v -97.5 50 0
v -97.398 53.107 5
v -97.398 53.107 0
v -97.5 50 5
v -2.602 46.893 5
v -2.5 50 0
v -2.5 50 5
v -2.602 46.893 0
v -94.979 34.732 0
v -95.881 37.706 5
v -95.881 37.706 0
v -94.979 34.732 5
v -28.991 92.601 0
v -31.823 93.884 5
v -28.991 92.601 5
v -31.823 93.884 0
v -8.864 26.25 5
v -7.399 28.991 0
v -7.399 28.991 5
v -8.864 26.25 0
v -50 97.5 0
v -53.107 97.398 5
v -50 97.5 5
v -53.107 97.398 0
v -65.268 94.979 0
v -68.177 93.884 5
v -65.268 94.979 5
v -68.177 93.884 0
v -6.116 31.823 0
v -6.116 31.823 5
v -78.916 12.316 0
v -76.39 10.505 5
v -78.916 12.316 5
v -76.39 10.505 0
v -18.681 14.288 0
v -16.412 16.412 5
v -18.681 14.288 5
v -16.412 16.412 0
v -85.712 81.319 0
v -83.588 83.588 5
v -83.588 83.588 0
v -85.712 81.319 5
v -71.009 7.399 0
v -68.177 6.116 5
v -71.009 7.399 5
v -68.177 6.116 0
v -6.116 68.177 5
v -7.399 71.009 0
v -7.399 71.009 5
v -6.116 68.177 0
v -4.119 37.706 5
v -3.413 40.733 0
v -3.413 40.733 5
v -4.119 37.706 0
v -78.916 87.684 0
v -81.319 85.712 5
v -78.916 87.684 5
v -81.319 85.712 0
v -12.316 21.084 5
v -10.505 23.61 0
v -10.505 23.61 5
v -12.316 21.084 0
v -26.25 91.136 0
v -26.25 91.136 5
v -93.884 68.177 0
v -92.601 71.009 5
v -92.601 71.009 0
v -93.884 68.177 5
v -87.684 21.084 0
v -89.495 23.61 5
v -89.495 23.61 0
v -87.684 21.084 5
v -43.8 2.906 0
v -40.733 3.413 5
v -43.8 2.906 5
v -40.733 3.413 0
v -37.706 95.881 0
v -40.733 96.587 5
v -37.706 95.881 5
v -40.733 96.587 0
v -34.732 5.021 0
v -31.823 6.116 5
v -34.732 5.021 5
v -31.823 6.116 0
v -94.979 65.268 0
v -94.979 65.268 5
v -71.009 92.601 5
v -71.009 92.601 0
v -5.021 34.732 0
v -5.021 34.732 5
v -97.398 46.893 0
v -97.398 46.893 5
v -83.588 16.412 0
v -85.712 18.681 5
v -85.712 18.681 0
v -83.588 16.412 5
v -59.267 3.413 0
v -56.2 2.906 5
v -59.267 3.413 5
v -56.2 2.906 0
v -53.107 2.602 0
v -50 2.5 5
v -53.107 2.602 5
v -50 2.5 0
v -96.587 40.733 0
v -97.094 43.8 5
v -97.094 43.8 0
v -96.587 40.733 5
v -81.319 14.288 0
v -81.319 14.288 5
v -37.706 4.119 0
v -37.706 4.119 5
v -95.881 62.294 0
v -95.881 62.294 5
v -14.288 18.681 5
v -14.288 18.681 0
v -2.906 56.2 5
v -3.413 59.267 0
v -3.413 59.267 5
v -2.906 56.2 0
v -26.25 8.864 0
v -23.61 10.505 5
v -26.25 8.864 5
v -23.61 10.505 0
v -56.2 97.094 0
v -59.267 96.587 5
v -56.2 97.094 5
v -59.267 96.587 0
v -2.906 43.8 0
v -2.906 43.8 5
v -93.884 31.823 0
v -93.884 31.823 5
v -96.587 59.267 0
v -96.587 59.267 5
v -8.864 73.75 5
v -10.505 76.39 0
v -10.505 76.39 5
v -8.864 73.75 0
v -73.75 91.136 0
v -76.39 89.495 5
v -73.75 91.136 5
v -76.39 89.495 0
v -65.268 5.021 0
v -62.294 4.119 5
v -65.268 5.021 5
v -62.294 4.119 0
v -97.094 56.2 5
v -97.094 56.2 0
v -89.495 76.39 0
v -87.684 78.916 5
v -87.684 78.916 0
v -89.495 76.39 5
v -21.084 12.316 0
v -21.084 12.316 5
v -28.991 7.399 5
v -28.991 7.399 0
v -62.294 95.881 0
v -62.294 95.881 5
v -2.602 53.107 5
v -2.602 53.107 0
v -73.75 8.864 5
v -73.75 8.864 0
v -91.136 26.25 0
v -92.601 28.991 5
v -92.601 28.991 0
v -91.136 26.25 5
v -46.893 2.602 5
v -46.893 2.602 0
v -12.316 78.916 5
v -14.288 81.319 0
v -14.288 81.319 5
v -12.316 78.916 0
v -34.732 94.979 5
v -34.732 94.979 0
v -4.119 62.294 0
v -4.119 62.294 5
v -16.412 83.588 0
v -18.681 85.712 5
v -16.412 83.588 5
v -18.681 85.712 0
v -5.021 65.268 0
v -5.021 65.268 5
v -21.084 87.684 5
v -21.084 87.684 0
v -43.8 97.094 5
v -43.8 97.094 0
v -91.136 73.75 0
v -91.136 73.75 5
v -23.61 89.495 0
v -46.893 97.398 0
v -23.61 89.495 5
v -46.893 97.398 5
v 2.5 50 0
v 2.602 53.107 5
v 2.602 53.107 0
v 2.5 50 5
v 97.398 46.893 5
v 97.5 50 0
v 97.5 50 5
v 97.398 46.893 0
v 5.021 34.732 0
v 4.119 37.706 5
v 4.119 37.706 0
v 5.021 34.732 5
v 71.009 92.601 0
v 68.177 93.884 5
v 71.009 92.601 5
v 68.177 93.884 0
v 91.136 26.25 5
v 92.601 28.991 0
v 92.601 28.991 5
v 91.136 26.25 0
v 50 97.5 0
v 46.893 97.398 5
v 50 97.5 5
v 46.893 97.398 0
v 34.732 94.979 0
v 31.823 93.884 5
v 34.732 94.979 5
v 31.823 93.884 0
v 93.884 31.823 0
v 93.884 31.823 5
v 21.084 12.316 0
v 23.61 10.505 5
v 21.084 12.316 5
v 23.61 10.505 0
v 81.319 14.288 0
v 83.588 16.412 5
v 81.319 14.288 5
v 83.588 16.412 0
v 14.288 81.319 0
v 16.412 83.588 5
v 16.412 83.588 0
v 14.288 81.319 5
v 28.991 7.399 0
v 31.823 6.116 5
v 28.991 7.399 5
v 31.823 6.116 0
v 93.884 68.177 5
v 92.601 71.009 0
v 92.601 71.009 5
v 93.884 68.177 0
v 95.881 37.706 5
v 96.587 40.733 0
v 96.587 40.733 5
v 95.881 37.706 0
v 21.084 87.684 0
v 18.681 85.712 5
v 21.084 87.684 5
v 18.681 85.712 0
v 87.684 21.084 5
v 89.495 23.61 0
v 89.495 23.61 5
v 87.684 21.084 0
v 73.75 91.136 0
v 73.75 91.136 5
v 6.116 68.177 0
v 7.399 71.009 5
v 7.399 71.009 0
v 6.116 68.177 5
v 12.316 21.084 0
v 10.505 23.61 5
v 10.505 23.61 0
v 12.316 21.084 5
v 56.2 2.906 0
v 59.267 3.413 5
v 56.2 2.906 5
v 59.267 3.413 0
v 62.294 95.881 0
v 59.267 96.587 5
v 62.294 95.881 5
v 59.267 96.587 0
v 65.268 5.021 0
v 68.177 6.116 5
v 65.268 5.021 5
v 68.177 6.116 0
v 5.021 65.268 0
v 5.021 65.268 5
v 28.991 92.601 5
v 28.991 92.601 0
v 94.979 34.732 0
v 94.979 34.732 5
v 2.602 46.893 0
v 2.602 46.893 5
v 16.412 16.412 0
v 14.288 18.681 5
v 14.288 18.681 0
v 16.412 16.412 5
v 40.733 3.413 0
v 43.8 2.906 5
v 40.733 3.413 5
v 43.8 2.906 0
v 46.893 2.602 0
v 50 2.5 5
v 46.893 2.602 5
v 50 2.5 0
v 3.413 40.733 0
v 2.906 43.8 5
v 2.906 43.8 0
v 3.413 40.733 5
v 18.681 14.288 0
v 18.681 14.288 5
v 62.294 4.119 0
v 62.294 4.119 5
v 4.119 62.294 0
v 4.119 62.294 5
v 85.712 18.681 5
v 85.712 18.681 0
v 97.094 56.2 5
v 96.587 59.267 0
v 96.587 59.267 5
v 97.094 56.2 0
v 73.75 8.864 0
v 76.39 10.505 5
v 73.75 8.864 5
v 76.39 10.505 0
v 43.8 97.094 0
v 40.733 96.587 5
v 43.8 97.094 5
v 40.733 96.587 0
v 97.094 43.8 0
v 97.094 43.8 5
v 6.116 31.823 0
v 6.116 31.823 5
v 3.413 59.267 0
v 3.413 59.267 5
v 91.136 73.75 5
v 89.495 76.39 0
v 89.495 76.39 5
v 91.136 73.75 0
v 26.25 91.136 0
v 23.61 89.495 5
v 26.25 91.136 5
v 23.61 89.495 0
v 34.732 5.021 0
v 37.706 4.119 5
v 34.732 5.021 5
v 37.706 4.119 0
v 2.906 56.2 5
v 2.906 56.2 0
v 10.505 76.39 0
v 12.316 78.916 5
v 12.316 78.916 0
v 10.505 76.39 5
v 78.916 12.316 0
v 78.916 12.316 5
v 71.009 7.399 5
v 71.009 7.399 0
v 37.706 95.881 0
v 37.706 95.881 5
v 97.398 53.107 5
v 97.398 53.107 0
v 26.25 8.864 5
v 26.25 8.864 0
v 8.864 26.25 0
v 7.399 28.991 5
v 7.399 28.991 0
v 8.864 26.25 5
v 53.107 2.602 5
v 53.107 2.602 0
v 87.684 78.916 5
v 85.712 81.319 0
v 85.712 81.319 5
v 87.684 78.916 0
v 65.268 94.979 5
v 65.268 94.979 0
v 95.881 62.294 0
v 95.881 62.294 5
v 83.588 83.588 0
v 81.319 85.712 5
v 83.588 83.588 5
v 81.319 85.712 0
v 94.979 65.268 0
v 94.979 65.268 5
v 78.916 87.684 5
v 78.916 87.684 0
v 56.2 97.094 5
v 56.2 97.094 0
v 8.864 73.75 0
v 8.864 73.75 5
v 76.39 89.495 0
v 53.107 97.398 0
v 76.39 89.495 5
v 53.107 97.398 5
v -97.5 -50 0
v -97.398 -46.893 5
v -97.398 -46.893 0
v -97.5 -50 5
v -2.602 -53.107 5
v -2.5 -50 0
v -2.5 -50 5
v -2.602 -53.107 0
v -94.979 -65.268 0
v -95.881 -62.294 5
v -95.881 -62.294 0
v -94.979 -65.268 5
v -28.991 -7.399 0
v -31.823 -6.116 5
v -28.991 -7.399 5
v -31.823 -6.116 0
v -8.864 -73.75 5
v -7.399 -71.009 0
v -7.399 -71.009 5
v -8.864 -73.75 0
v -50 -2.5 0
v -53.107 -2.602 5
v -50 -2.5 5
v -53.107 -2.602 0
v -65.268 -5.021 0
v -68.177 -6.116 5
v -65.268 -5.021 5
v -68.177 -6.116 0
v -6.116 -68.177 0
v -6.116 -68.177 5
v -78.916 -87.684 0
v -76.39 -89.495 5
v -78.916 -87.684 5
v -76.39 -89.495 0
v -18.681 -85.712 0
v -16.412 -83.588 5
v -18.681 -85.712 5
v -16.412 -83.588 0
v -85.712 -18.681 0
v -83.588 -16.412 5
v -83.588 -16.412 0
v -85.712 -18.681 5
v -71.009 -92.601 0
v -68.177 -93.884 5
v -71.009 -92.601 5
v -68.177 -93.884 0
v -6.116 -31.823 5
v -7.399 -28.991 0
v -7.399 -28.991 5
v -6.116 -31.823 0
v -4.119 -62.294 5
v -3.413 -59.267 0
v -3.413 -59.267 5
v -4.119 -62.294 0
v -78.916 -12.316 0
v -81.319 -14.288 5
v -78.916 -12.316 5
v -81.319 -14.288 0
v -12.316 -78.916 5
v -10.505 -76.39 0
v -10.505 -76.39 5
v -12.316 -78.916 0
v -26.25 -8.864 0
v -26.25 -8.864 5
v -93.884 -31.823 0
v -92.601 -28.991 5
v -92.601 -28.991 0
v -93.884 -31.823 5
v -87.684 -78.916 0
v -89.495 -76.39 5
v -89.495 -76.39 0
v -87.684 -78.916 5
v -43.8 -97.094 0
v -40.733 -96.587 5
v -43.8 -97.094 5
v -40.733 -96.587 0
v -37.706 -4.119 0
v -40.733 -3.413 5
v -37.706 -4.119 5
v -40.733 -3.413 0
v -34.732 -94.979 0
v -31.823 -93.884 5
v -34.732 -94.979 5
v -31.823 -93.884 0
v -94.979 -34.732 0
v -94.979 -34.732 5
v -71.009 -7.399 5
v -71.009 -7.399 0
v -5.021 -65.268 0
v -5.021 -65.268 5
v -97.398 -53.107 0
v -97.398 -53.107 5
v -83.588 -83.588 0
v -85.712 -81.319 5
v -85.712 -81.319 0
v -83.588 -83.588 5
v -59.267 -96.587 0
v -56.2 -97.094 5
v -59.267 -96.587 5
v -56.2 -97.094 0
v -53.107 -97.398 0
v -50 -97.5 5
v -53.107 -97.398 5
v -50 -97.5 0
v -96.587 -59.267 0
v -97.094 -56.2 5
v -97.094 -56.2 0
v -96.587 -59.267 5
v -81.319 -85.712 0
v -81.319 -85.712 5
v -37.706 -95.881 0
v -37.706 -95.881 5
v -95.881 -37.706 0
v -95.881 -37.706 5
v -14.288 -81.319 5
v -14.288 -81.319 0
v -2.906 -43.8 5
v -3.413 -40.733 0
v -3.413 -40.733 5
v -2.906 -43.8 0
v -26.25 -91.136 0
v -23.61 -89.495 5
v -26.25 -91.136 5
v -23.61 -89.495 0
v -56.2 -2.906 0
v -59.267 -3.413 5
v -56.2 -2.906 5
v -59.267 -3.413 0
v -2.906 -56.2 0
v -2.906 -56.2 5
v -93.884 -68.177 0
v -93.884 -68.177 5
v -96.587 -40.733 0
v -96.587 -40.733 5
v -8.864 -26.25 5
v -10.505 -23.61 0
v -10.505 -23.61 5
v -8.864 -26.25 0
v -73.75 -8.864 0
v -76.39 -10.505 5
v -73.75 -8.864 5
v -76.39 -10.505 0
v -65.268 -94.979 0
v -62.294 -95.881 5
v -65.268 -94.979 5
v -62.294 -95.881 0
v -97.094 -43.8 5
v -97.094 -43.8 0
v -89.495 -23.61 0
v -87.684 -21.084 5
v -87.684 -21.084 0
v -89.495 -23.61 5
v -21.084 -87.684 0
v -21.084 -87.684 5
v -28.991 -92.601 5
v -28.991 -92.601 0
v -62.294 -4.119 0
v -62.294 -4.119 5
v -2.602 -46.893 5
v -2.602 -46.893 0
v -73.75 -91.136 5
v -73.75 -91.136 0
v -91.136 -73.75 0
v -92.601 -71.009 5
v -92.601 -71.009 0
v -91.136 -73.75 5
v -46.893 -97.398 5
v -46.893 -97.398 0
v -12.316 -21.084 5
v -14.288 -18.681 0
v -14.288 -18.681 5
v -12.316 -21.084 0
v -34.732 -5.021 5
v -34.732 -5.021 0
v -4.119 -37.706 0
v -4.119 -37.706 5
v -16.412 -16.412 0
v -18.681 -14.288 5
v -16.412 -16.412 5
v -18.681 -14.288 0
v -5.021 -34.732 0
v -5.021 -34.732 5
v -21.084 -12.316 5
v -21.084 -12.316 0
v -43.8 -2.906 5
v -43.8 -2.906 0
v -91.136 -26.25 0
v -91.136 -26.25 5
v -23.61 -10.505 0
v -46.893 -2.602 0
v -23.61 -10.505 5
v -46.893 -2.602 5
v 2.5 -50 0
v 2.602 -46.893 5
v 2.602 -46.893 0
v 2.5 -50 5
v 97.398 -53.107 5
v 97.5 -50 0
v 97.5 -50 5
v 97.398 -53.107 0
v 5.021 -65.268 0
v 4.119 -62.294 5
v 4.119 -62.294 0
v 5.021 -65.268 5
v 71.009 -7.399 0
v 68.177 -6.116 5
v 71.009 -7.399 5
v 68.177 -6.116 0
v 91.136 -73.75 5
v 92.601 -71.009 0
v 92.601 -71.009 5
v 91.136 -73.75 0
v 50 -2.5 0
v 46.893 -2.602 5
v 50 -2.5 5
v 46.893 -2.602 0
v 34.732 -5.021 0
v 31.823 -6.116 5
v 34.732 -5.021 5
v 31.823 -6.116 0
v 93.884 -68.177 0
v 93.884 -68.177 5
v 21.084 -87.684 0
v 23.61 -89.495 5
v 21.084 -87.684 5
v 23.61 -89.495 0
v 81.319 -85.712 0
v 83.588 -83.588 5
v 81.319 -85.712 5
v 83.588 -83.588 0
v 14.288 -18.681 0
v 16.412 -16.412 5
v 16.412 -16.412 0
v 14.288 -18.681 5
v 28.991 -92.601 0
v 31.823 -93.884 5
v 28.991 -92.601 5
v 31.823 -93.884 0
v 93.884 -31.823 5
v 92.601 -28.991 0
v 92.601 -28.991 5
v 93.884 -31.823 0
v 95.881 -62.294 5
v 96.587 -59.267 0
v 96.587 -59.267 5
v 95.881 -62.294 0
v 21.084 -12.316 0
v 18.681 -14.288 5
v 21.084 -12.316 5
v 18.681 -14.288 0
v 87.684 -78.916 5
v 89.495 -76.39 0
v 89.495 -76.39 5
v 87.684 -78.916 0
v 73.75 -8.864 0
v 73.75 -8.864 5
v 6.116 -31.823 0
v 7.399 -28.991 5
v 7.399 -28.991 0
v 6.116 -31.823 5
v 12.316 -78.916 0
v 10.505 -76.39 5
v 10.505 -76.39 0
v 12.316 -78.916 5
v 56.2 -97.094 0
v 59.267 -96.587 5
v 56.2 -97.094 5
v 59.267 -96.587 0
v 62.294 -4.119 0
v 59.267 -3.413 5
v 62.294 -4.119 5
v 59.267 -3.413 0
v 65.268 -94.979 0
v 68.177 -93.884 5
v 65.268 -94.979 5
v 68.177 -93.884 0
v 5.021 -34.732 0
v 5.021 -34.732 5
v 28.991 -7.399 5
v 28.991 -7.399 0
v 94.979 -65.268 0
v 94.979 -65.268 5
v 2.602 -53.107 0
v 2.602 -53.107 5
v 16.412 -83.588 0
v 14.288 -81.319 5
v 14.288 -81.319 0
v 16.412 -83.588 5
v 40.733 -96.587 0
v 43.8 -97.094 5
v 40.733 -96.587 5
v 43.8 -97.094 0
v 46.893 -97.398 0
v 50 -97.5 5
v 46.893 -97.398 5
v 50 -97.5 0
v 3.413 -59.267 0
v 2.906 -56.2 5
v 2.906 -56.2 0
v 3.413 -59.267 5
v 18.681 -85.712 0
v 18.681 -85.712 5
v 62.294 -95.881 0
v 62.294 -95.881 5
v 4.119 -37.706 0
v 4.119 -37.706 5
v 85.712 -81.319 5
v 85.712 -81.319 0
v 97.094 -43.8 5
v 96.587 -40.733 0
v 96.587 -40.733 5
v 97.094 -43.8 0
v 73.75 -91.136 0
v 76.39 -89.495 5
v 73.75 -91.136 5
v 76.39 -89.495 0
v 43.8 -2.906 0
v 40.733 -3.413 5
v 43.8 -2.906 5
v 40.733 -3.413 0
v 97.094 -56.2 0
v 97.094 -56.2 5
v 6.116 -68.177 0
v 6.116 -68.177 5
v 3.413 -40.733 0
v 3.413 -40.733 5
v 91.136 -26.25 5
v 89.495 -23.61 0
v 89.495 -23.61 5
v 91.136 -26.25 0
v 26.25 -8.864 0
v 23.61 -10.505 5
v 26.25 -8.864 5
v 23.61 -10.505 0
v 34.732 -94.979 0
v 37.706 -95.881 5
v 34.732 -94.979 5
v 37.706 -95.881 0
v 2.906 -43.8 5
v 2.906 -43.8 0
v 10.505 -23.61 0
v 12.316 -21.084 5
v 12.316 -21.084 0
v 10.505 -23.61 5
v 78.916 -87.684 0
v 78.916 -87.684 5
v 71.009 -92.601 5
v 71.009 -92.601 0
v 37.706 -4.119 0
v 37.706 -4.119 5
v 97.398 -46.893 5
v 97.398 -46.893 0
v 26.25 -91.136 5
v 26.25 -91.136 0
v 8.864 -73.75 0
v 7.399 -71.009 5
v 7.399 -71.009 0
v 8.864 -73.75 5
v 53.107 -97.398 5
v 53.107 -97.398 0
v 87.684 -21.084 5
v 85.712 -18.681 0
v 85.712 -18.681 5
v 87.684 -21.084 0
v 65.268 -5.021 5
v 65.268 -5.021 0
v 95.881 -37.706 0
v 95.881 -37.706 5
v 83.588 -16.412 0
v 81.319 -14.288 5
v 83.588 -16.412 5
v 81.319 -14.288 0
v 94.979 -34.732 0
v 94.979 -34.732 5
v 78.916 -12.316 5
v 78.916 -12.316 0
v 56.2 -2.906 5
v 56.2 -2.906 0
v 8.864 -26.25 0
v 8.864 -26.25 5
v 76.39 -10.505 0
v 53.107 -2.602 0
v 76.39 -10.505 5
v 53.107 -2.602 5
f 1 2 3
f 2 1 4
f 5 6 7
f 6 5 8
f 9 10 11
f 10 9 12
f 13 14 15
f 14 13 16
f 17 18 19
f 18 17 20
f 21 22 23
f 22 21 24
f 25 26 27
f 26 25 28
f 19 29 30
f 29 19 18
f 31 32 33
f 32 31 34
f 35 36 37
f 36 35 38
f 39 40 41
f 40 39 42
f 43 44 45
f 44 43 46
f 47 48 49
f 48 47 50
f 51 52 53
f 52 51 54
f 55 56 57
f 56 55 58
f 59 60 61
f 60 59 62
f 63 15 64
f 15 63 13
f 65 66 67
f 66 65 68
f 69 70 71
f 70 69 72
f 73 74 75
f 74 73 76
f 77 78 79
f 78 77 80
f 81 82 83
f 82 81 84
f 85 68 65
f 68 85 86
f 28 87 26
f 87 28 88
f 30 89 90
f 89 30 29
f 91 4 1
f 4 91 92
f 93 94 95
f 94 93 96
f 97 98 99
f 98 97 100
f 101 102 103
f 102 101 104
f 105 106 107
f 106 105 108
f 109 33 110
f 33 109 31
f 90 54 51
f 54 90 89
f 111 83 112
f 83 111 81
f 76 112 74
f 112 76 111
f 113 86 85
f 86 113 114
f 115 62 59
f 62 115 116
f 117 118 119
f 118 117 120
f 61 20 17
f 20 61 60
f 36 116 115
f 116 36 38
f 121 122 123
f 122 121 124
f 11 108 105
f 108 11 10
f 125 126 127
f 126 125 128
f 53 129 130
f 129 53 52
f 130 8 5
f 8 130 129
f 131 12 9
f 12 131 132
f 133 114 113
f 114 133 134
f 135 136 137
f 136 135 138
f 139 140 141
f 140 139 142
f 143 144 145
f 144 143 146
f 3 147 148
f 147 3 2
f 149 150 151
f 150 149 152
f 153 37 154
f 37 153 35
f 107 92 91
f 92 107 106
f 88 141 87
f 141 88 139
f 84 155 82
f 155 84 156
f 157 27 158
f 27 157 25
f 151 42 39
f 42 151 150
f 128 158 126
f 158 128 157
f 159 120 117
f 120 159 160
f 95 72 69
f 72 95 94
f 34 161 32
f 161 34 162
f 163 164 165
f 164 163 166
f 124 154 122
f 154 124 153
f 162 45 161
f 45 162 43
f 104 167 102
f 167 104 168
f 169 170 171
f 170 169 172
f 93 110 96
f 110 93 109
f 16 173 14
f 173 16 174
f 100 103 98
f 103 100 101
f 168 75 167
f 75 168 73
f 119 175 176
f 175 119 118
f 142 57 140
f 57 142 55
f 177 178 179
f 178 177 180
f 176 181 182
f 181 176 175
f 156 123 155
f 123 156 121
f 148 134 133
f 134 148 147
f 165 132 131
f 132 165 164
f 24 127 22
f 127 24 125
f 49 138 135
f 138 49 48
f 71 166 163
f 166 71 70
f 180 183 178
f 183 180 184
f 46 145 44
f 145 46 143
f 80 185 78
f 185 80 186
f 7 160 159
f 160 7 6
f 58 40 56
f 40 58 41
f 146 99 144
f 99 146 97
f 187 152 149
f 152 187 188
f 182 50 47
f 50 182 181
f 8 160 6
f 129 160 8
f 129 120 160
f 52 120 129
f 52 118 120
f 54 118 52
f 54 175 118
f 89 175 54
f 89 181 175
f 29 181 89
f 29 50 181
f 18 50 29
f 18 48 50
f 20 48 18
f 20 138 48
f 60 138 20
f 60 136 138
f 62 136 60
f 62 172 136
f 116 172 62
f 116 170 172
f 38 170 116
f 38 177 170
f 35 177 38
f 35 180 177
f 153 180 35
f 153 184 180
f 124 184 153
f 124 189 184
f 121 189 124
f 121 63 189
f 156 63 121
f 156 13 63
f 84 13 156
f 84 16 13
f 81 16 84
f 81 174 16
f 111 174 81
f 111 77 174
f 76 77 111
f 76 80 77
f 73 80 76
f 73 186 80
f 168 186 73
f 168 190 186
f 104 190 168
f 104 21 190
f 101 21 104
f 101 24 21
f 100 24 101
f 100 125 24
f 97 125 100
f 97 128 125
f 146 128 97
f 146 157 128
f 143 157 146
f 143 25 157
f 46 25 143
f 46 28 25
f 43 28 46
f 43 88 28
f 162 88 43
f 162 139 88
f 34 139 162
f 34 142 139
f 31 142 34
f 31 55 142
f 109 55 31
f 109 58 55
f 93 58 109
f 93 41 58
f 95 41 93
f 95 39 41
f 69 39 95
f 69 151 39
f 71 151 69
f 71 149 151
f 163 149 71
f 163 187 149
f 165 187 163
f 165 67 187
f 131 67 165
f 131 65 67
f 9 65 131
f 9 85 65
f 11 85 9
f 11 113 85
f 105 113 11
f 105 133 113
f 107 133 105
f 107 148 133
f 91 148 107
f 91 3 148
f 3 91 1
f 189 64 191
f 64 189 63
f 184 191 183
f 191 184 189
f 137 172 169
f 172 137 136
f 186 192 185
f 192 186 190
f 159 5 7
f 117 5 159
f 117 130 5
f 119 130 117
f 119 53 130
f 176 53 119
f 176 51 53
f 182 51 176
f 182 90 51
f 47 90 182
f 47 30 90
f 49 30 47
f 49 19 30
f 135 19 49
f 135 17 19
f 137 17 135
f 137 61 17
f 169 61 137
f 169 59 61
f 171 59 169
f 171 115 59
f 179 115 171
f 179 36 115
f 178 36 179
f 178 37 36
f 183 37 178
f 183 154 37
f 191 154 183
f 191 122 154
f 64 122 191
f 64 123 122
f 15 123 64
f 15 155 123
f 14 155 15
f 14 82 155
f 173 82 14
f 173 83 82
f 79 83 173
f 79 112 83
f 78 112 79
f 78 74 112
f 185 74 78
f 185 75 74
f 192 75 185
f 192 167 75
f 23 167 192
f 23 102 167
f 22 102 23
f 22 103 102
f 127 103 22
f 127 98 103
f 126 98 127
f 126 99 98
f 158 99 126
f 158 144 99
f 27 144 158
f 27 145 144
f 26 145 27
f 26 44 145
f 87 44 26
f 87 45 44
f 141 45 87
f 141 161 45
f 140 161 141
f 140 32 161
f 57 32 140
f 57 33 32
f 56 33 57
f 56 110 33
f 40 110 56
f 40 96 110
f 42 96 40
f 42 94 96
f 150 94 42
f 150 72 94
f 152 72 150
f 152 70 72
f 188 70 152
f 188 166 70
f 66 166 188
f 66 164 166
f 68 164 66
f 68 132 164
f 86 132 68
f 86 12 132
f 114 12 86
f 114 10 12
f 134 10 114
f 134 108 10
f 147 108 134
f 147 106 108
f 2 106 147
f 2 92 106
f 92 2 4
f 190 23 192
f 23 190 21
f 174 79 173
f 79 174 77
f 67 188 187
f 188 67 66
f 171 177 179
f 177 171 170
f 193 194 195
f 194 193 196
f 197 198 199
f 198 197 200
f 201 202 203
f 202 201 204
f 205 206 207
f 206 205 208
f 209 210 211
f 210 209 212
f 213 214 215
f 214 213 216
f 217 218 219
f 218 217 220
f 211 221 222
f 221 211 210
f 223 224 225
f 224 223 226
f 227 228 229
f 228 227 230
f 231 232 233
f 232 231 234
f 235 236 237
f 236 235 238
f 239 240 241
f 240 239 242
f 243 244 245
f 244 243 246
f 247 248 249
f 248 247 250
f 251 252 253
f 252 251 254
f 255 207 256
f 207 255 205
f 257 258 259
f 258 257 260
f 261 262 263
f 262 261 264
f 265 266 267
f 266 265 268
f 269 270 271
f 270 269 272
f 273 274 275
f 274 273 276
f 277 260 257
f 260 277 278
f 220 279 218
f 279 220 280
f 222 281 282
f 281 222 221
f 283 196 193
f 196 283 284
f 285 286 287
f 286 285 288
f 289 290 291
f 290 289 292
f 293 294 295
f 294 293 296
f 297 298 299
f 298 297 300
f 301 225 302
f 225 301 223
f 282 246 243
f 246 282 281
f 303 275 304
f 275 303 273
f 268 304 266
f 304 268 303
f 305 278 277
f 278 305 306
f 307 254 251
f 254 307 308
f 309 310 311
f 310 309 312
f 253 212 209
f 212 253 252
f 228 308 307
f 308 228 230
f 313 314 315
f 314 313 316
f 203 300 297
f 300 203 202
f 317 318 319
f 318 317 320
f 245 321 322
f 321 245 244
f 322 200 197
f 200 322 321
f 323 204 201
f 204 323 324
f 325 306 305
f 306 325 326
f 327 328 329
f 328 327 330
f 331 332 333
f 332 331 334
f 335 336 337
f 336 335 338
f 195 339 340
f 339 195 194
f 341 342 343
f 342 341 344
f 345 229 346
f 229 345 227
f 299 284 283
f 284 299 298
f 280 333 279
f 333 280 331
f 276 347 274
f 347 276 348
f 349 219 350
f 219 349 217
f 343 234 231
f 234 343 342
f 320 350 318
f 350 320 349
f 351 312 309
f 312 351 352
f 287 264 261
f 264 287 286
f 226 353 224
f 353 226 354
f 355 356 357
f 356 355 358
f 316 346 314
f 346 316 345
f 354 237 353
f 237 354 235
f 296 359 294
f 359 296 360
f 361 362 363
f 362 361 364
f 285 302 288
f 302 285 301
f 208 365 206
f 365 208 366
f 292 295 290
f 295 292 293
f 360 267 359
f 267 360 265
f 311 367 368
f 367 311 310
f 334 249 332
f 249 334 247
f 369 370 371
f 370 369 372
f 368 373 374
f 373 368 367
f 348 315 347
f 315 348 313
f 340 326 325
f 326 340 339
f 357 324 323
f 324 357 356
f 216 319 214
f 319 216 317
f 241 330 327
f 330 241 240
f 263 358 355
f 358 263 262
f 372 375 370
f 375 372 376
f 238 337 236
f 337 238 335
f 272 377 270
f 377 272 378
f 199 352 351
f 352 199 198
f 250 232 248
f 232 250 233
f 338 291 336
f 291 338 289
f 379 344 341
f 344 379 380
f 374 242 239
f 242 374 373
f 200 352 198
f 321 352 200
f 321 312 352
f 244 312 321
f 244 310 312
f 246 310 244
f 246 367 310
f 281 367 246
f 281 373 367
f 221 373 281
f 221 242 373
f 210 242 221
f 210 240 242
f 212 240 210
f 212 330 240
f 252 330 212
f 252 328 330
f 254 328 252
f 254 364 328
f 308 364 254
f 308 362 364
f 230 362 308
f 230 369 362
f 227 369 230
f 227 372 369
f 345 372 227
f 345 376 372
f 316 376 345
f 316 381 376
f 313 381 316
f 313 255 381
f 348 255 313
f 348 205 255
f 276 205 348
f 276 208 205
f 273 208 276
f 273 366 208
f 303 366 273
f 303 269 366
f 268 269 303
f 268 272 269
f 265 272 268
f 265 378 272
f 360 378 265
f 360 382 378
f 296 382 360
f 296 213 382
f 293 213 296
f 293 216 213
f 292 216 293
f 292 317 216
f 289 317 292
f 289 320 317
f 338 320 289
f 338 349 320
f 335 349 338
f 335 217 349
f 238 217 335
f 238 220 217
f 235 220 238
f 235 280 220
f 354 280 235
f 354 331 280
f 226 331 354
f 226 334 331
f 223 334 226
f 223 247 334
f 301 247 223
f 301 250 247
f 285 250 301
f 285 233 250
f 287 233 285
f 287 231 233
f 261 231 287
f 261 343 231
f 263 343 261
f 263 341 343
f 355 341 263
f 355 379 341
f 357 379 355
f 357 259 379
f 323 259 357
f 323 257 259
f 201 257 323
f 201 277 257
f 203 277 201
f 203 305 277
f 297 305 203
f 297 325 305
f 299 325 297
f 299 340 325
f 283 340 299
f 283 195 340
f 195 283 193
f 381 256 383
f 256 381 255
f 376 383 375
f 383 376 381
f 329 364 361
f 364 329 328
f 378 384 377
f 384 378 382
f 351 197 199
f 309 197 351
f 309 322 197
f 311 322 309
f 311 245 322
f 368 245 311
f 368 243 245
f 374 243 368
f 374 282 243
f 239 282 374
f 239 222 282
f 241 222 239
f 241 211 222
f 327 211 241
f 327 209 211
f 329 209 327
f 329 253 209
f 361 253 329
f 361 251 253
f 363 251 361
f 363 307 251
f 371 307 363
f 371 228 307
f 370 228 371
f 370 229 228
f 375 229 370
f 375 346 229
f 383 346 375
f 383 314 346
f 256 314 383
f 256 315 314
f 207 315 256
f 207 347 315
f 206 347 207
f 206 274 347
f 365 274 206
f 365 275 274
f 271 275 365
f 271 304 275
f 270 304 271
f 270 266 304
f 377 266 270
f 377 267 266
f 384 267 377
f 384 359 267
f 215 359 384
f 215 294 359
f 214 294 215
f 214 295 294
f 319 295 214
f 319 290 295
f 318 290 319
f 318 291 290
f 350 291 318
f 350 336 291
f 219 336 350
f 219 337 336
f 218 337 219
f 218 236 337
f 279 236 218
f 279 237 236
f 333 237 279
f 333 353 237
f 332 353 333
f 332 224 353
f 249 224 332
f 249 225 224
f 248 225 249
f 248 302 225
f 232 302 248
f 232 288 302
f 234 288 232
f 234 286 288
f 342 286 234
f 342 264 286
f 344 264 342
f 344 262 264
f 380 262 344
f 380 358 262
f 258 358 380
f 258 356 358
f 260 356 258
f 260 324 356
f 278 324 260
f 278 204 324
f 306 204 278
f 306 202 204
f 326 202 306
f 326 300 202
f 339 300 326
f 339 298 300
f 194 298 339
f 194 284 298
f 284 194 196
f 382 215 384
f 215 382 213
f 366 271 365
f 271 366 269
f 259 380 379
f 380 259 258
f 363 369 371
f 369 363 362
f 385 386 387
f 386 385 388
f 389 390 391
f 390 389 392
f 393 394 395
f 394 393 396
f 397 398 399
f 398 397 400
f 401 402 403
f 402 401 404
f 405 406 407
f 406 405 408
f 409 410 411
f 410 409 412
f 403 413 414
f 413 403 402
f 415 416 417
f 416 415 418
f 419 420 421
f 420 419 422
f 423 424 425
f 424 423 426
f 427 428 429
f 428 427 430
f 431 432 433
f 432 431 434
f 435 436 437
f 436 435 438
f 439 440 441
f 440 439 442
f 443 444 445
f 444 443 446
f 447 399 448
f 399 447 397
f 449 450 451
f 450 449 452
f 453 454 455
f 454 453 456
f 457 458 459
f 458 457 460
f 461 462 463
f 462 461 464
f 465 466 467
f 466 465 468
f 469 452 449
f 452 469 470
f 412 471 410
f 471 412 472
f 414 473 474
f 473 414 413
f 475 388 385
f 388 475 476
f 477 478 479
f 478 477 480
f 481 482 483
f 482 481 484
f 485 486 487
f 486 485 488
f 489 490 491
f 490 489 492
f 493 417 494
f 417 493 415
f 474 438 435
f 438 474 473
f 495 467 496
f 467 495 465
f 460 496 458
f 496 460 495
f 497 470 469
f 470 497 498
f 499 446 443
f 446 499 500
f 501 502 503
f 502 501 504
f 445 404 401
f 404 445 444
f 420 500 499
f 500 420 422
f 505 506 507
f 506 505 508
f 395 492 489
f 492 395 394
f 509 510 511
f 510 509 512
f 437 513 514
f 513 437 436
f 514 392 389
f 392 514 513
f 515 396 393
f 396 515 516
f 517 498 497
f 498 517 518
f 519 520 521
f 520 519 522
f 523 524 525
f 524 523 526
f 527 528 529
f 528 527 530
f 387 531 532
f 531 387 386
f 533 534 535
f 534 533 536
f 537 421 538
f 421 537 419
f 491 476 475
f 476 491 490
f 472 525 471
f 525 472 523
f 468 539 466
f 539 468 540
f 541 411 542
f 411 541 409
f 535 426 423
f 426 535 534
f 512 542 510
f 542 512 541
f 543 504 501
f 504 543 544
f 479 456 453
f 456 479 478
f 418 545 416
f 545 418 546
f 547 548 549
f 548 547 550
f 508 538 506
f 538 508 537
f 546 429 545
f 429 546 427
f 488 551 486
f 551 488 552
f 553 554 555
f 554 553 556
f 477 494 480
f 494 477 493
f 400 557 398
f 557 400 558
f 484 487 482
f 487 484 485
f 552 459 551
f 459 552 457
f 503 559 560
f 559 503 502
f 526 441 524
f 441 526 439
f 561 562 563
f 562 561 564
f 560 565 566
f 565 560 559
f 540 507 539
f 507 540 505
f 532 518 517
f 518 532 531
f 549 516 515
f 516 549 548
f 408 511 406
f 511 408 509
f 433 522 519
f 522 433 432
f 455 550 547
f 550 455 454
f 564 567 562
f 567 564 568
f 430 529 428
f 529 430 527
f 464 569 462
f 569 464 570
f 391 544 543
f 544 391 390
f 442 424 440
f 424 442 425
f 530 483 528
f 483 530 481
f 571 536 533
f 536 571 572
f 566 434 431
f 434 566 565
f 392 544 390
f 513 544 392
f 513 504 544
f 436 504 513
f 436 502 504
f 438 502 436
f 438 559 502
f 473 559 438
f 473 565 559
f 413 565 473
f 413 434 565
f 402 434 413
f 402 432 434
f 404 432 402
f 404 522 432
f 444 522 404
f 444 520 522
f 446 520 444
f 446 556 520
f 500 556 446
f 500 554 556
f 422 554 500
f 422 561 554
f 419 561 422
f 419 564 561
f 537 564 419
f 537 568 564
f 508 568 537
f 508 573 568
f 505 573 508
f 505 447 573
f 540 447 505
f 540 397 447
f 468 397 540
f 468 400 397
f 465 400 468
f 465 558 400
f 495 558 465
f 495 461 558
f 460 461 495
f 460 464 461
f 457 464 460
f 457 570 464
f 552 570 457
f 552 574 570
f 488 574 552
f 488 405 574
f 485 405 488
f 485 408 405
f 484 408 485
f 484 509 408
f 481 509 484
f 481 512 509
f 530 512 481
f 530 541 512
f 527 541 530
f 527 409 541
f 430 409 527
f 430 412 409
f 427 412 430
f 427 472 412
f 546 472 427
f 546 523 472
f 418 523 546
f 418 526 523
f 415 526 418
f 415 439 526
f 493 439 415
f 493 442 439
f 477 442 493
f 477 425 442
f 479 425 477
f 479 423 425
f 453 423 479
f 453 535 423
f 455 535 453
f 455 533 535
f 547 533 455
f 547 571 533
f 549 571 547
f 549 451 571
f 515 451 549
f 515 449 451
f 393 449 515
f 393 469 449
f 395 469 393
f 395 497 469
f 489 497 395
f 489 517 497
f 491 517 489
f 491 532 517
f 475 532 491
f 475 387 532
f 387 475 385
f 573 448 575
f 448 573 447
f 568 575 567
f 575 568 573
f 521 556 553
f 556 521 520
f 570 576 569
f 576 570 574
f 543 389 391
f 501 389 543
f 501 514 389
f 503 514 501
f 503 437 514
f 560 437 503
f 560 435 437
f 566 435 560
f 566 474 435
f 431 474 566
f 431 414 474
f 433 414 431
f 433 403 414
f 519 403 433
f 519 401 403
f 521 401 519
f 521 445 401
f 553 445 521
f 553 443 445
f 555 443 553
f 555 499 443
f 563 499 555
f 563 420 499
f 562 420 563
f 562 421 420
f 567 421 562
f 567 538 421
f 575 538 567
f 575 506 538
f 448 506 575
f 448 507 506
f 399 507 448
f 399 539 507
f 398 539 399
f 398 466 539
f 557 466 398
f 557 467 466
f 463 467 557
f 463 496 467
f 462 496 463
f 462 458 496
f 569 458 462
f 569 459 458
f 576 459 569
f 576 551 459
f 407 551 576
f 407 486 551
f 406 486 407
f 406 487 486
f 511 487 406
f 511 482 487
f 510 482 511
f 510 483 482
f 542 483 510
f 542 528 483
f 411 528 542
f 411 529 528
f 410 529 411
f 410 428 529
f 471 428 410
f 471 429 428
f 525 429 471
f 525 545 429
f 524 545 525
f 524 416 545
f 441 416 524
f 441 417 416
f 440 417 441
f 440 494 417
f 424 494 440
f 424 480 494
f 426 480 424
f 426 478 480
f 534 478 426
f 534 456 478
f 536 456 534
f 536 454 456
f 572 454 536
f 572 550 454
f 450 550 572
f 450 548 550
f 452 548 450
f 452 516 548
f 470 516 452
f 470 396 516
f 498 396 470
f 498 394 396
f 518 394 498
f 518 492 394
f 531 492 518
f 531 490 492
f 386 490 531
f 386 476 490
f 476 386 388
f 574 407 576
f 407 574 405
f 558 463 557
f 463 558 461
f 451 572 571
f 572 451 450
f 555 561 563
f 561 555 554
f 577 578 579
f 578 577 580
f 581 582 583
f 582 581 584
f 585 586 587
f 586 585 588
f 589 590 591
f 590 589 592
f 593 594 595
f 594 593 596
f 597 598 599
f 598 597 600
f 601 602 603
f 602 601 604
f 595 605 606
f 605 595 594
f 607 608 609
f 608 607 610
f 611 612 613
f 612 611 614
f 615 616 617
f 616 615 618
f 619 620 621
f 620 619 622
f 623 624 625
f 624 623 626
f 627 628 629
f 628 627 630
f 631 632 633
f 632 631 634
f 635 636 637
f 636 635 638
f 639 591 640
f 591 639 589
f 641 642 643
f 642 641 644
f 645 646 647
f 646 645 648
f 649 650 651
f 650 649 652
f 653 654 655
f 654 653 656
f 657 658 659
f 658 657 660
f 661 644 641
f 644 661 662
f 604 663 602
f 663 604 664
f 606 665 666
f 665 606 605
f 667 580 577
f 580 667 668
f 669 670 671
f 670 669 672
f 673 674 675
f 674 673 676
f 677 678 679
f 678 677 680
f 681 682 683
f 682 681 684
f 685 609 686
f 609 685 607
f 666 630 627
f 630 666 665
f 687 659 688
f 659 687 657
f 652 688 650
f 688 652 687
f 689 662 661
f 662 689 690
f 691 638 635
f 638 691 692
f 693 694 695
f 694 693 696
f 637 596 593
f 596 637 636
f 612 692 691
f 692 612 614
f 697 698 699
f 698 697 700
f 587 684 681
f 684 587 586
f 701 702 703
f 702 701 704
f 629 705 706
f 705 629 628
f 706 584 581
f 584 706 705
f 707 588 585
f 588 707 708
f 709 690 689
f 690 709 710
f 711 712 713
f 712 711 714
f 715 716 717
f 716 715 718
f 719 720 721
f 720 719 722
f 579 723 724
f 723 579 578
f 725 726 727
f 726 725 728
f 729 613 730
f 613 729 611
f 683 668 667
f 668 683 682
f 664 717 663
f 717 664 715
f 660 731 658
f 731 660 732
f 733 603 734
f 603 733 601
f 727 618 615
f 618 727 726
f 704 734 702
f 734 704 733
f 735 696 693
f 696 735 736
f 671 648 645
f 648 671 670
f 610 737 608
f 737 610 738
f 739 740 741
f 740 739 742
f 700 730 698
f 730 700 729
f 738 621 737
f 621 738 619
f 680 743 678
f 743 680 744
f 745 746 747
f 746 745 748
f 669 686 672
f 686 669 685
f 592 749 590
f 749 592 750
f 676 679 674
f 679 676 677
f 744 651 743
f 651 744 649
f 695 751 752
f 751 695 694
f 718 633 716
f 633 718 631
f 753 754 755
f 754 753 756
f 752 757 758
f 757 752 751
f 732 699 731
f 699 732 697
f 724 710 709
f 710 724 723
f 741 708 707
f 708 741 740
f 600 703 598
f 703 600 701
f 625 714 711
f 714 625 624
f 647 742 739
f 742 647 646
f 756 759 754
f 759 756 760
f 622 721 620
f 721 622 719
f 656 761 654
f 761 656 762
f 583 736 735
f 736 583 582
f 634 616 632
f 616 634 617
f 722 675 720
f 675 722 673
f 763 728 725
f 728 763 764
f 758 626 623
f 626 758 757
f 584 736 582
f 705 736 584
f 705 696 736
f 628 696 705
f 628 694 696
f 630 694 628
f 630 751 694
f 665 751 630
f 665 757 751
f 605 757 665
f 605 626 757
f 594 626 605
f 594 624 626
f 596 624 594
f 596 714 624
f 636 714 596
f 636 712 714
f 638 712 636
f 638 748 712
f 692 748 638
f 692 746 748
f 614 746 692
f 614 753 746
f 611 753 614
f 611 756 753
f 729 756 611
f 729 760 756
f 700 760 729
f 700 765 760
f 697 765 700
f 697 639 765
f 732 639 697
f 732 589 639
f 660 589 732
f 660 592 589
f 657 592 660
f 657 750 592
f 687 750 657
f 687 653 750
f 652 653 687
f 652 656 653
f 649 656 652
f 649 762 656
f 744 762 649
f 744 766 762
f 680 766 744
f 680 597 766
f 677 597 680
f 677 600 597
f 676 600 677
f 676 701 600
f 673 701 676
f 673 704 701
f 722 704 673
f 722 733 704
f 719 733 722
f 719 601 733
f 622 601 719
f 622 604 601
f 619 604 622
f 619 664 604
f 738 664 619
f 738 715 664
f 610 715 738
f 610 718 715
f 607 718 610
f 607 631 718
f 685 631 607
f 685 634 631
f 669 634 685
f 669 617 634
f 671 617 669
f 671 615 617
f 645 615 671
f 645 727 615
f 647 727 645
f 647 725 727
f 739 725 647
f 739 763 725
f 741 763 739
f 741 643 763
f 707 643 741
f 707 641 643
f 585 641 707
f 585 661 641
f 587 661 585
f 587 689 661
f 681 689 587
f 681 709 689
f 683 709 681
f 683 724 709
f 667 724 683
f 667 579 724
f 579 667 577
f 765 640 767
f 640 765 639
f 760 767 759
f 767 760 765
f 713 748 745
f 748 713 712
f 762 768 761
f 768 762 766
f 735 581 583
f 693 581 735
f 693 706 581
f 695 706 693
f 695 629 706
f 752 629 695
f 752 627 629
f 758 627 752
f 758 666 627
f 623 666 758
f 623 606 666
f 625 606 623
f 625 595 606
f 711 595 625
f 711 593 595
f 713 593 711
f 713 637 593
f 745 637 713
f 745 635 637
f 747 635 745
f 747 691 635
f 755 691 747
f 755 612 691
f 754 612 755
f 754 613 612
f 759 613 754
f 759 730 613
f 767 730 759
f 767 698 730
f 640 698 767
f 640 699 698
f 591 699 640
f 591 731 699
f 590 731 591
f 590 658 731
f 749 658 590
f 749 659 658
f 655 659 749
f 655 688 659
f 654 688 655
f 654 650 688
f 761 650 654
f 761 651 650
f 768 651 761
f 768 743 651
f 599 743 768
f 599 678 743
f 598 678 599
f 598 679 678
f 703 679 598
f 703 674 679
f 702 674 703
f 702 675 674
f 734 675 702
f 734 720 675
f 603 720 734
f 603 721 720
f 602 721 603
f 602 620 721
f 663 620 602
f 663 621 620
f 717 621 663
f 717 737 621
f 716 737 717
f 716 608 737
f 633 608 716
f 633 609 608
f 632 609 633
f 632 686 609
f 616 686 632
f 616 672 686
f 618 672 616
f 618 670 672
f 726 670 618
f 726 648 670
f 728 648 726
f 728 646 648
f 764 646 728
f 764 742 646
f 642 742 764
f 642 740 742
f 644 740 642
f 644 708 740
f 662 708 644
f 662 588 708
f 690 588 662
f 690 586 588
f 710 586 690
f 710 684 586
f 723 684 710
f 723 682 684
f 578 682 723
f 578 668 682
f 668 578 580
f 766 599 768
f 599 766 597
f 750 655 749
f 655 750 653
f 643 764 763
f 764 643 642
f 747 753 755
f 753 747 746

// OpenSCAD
// Coaster set — flat coasters with a pattern, letter, text or picture inlaid
// flush in a second colour, laid out on one plate or more, with an optional
// border ring in a third colour, an optional recess underneath for a cork or
// felt pad, and an optional holder that the stack drops into.
//
// Coasters are for standing drinks on; they are not food-contact items.
//
// The inlay is 0.6 mm deep by default, so only the first or last few layers
// change colour. By default the decorated face prints up. "Decorated face
// down" puts it on the plate for the plate's smooth or textured finish; the
// underside recess always prints that way, because on the bed it would be
// an unsupported ceiling. The holder prints upright; its finger slots are
// open at the top, so nothing needs supports.
//
// The picture overlay takes an SVG or PNG (a `// file:svg,png` parameter;
// before ScadBuddy's file parameters land it is a plain text field that
// takes a bare file name in this directory, e.g. sample-overlay.svg).
//
// Written to the MakerWorld Parametric Model Maker customizer conventions so
// the same file works unchanged on MakerWorld and in ScadBuddy.
//
// The colour parameters are the extruder order: coaster_color is extruder 1,
// pattern_color 2, border_color 3, overlay_color 4, holder_color 5. Parts
// that are switched off take no extruder, and equal colours merge into one
// part and one filament.

/* [Coaster] */

// Outline of each coaster
shape = "round"; // [round:Round, square:Square, hexagon:Hexagon, rounded_square:Rounded square]

// Size in mm: diameter (round), side (square, rounded square), across the flats (hexagon)
size = 95; // [60:1:150]

// Thickness in mm
thickness = 5; // [3:0.5:10]

// Corner radius of the rounded square, in mm (at most half the size less 1 mm)
corner_radius = 14; // [2:1:40]

// Width of the border ring in its own colour, in mm (0 = no border)
border_width = 3; // [0:0.5:12]

// Depth of the inlay (pattern, border, picture), in mm
inlay_depth = 0.6; // [0.4:0.2:2]

// Which face prints on the plate (a cork recess always prints face down)
face = "up"; // [up:Decorated face up, down:Decorated face down - plate finish on top]

/* [Pattern] */

// What is inlaid in the middle of the coaster
pattern = "honeycomb"; // [none:None - plain, stripes:Diagonal stripes, chevron:Chevron, checker:Checkerboard, rings:Concentric rings, honeycomb:Honeycomb, dots:Polka dots, sunburst:Sunburst, monogram:Monogram letter, text:Text]

// Pattern spacing in mm (stripe pitch, cell or ring size)
spacing = 12; // [5:1:40]

// Line width of the line patterns, in mm
line_width = 2; // [0.8:0.2:6]

// Rotate the pattern, in degrees (not the monogram or text)
pattern_rotation = 0; // [0:5:180]

// Monogram letters: one per coaster, in order, repeating ("ABCD" gives each coaster its own)
letters = "A"; // 12

// Text for the text pattern
text = "CHEERS"; // 20

// Typeface for the monogram and text
font = "DejaVu Serif:style=Bold"; // font

// Swap coaster and pattern colours on every other coaster
alternate_colors = false;

/* [Overlay] */

// Picture to inlay: upload an SVG or PNG (or a bare file name in this model's directory, e.g. sample-overlay.svg). Empty = off.
overlay_file = ""; // file:svg,png

// File type: auto picks by extension; an SVG outline, or a PNG cut at a brightness threshold
overlay_type = "auto"; // [auto:Auto - by file extension, svg:SVG outline, png_threshold:Image threshold - PNG]

// Picture width as a percentage of the coaster size
overlay_scale = 60; // [10:5:100]

// Move the picture right, mm
overlay_x = 0; // [-50:1:50]

// Move the picture up, mm
overlay_y = 0; // [-50:1:50]

// Rotate the picture, degrees
overlay_rotation = 0; // [-180:5:180]

// PNG: pixels darker than this brightness (percent) form the picture
image_threshold = 50; // [1:1:99]

// Swap picture and background (fills the pattern area except the picture)
overlay_invert = false;

// Clear the pattern under and around the picture
overlay_clears_pattern = true;

/* [Set] */

// How many coasters
count = 4; // [1:1:12]

// Gap between parts on the plate, in mm
gap = 5; // [3:1:20]

// Underside
underside = "plain"; // [plain:Plain, recess:Recess for a cork or felt pad]

// Recess depth, in mm (2 for 2 mm cork, 1 for felt; with the recess only)
recess_depth = 2; // [0.6:0.2:4]

// Rim left around the recess, in mm (with the recess only)
recess_rim = 4; // [2:0.5:15]

// Add a holder the stack of coasters drops into
holder = false;

// Clearance between the coasters and the holder, per side, in mm
holder_clearance = 1; // [0.4:0.1:3]

/* [Colors] */

// Coaster colour (extruder 1)
coaster_color = "#1E3A5F"; // color

// Pattern, letter and text colour (extruder 2)
pattern_color = "#F2C14E"; // color

// Border ring colour (extruder 3)
border_color = "#F2F2F2"; // color

// Picture colour (extruder 4)
overlay_color = "#E4572E"; // color

// Holder colour (extruder 5)
holder_color = "#1E3A5F"; // color

/* [Hidden] */

$fn = 96;
// ScadBuddy's plate convention: 0 draws every plate, N only plate N.
$plate = 0;

BED_X = 300;          // H2C plate with both nozzles
BED_Y = 320;
// A multi-colour plate needs room for the prime tower (#1048). ScadBuddy
// reserves it against one edge of the plate (backend render/plate.py): the
// tower, its 3 mm brim each side, 5 mm to the parts and 2 mm to the edge. The
// tower grows with the colours (#6735); a 60 mm square holds it for up to seven
// on the H2C. So the parts must leave this much free across the plate's width or
// its depth.
TOWER = 60 + 2 * 3 + 5 + 2;

d = inlay_depth;
face_down = face == "down" || underside == "recess";
// The recess leaves at least 1.2 mm of solid above the inlay; a thin coaster
// with a deep inlay gets a shallower recess, or none, and says so.
recess_max = max(0, thickness - d - 1.2);
recess_d = underside == "recess" ? min(recess_depth, recess_max) : 0;
if (underside == "recess" && recess_depth > recess_max)
    echo(str("NOTE: recess reduced from ", recess_depth, " to ", recess_d,
             " mm to leave 1.2 mm above the ", d, " mm inlay",
             recess_d == 0 ? "; no recess cut (raise thickness or lower inlay_depth)" : ""));

ext_x = shape == "hexagon" ? size / cos(30) : size;
ext_y = size;
cr = min(corner_radius, size / 2 - 1);

// Coaster outline grown (o > 0) or shrunk (o < 0) by o.
module shape_2d(o = 0) {
    if (shape == "round") circle(d = size + 2 * o);
    else if (shape == "square") offset(delta = o) square(size, center = true);
    else if (shape == "hexagon") offset(delta = o) circle(r = size / 2 / cos(30), $fn = 6);
    else offset(r = cr + o) square(size - 2 * cr, center = true);
}

// ---- pattern area --------------------------------------------------------------

has_border = border_width > 0;
pat_inset = border_width + 2;              // plain gap between border and pattern
pat_size = size - 2 * pat_inset;
R = size * 0.75;                           // half-extent the patterns fill

module pattern_area() { shape_2d(-pat_inset); }

module stripes_2d() {
    for (i = [-ceil(R / spacing) : ceil(R / spacing)])
        translate([i * spacing, 0]) square([line_width, 2 * R], center = true);
}

module chevron_2d() {
    amp = spacing / 2;
    for (j = [-ceil(R / spacing) : ceil(R / spacing)], k = [-ceil(R / spacing) - 1 : ceil(R / spacing)]) {
        y = j * spacing;
        x = k * spacing;
        hull() { translate([x, y]) circle(d = line_width, $fn = 16);
                 translate([x + spacing / 2, y + amp]) circle(d = line_width, $fn = 16); }
        hull() { translate([x + spacing / 2, y + amp]) circle(d = line_width, $fn = 16);
                 translate([x + spacing, y]) circle(d = line_width, $fn = 16); }
    }
}

module checker_2d() {
    n = ceil(R / spacing);
    for (i = [-n : n], j = [-n : n]) if ((i + j) % 2 == 0)
        translate([i * spacing, j * spacing]) square(spacing, center = true);
}

module rings_2d() {
    for (r = [spacing / 2 : spacing : R])
        difference() { circle(r = r + line_width / 2); circle(r = max(0.01, r - line_width / 2)); }
    circle(r = min(spacing / 4, line_width));
}

module honeycomb_2d() {
    rc = spacing / 2 / cos(30);                    // centre to corner of a cell
    n = ceil(R / spacing) + 1;
    for (i = [-n : n], j = [-n : n]) {
        x = i * 1.5 * rc;
        y = j * spacing + (i % 2 == 0 ? 0 : spacing / 2);
        translate([x, y]) difference() {
            circle(r = rc + line_width / 2 / cos(30), $fn = 6);
            circle(r = rc - line_width / 2 / cos(30), $fn = 6);
        }
    }
}

module dots_2d() {
    n = ceil(R / spacing) + 1;
    for (i = [-n : n], j = [-n : n])
        translate([i * spacing + (j % 2 == 0 ? 0 : spacing / 2), j * spacing * cos(30)])
            circle(d = spacing * 0.55, $fn = 32);
}

module sunburst_2d() {
    rays = max(8, 2 * round(PI * pat_size / 2 / spacing / 2));
    for (k = [0 : 2 : rays - 1])
        polygon([[0, 0], R * 2 * [cos(360 * k / rays), sin(360 * k / rays)],
                 R * 2 * [cos(360 * (k + 1) / rays), sin(360 * (k + 1) / rays)]]);
}

// Shrink-only fit (see models/name-sign): resize() scales to the bounding box
// of its children, and a hair-thin bar of the target length makes that box at
// least the target, so text already smaller is left alone and larger text is
// scaled down uniformly.
module fit_x(w) {
    projection(cut = true) translate([0, 0, -0.5])
        resize([w, 0, 0], auto = [false, true, false])
            union() {
                linear_extrude(1) children();
                translate([-w / 2, 0, 10]) cube([w, 0.01, 0.01]);
            }
}
module fit_y(h) {
    projection(cut = true) translate([0, 0, -0.5])
        resize([0, h, 0], auto = [true, false, false])
            union() {
                linear_extrude(1) children();
                translate([0, -h / 2, 10]) cube([0.01, h, 0.01]);
            }
}
module fit(w, h) { fit_y(h) fit_x(w) children(); }

module monogram_2d(i) {
    ch = letters == "" ? "" : letters[i % len(letters)];
    if (ch != "" && ch != " ")
        fit(pat_size * 0.62, pat_size * 0.62)
            text(ch, size = pat_size * 0.62, font = font, halign = "center", valign = "center");
}

module text_2d() {
    if (text != "") {
        // A 0.88 x 0.3 box fits inside every outline's pattern area.
        fit(pat_size * 0.88, pat_size * 0.3)
            text(text, size = pat_size * 0.18, font = font, halign = "center", valign = "center");
    }
}

if (pattern == "text" && text == "")
    echo("NOTE: pattern is Text but text is empty; the coasters are plain");
if (pattern == "monogram" && len([for (ch = letters) if (ch != " ") ch]) == 0)
    echo("NOTE: pattern is Monogram but letters is empty; the coasters are plain");

module pattern_raw(i) {
    if (pattern == "monogram") monogram_2d(i);
    else if (pattern == "text") text_2d();
    else rotate(pattern_rotation) {
        if (pattern == "stripes") rotate(45) stripes_2d();
        else if (pattern == "chevron") chevron_2d();
        else if (pattern == "checker") checker_2d();
        else if (pattern == "rings") rings_2d();
        else if (pattern == "honeycomb") honeycomb_2d();
        else if (pattern == "dots") dots_2d();
        else if (pattern == "sunburst") sunburst_2d();
    }
}

// ---- overlay (picture) -----------------------------------------------------------

// overlay_file reaches import() and surface() verbatim, and OpenSCAD reads any
// path it is given: only a bare file name in the model's own directory is
// accepted. A path, a leading dot or a backslash turns the overlay off.
function safe_file(f) =
    f != "" && len(search("/", f)) == 0 && len(search("\\", f)) == 0 && f[0] != ".";

OVERLAY_REFUSED = overlay_file != "" && !safe_file(overlay_file);
if (OVERLAY_REFUSED)
    echo(str("NOTE: overlay_file \"", overlay_file,
             "\" is not a bare file name in the model directory; overlay off"));
OVERLAY_ON = safe_file(overlay_file);

function lower(s) = s == "" ? "" : chr([for (c = s) let (o = ord(c)) (o >= 65 && o <= 90) ? o + 32 : o]);
function ends_with(f, suffix) =
    len(f) >= len(suffix)
    && [for (i = [0 : len(suffix) - 1]) f[len(f) - len(suffix) + i]] == [for (c = suffix) c];
// "auto" reads the extension (any case), so an uploaded PNG needs no second setting.
// "png_threshold" was "image_threshold" until #318 renamed it (it shared a name
// with the numeric image_threshold parameter); saved presets and past outputs
// still hold the old value, so both force the image reader.
// ScadBuddy accepts the old value in a render or a preset save (#432):
// retired overlay_type = "image_threshold"
OVERLAY_IS_IMAGE = overlay_type == "png_threshold" || overlay_type == "image_threshold"
    || (overlay_type == "auto" && ends_with(lower(overlay_file), ".png"));

// An SVG is imported as-is; an image goes through surface(), whose height is
// the pixel brightness (0-100), and the pixels darker than image_threshold
// are kept. A missing file only logs an error and gives an empty picture, so
// the coasters still render.
module overlay_source() {
    if (OVERLAY_IS_IMAGE)
        difference() {
            projection() surface(file = overlay_file, center = true);
            projection(cut = true)
                translate([0, 0, -image_threshold]) surface(file = overlay_file, center = true);
        }
    else
        import(overlay_file, center = true);
}

module overlay_placed() {
    translate([overlay_x, overlay_y]) rotate(overlay_rotation)
        resize([size * overlay_scale / 100, 0], auto = true) overlay_source();
}

module overlay_2d() {
    intersection() {
        pattern_area();
        if (overlay_invert) difference() { pattern_area(); overlay_placed(); }
        else overlay_placed();
    }
}

// ---- one coaster, parts by colour role ----------------------------------------------

// The inlay artwork is drawn as seen from above the decorated face; face
// down, it is mirrored so it reads correctly once the coaster is turned over.
module face_2d() { if (face_down) mirror([1, 0]) children(); else children(); }

module border_2d() { if (has_border) difference() { shape_2d(0); shape_2d(-border_width); } }

module pattern_2d(i) {
    difference() {
        intersection() { pattern_area(); pattern_raw(i); }
        if (OVERLAY_ON && overlay_clears_pattern) offset(delta = 1) overlay_2d();
        if (OVERLAY_ON) overlay_2d();
    }
}

z_inlay = face_down ? 0 : thickness - d;

module inlay(z = z_inlay) { translate([0, 0, z]) linear_extrude(d) children(); }

module body(i) {
    difference() {
        linear_extrude(thickness) shape_2d(0);
        translate([0, 0, z_inlay - (face_down ? 1 : 0)]) linear_extrude(d + 1) face_2d() {
            border_2d();
            pattern_2d(i);
            if (OVERLAY_ON) overlay_2d();
        }
        if (recess_d > 0)
            translate([0, 0, thickness - recess_d]) linear_extrude(recess_d + 1) shape_2d(-recess_rim);
    }
}

// ---- layout ------------------------------------------------------------------------

h_wall = 2.4;
h_base = 2.4;
h_in = holder_clearance;
// A hexagon grown by delta gains delta across the flats, delta / cos(30)
// across the corners.
h_ext_x = ext_x + 2 * (h_in + h_wall) / (shape == "hexagon" ? cos(30) : 1);
h_ext_y = ext_y + 2 * (h_in + h_wall);
// Coasters sit in a grid of cells their own size. The holder is a few mm
// larger than a coaster, so it does not take a grid cell (that would size
// every cell for it, #411): it goes beside the grid, below it, or in the
// empty end of the last row, whichever fits and is squarest.
px = ext_x + gap;
py = ext_y + gap;
HOLDER_MODES = ["beside", "below", "row end"];

// n coasters in c columns, the holder (when hd) placed by mode m:
// [plate width, plate height, holder corner x, y, grid x] from the top left,
// or undef where the mode does not apply (no empty end in a full last row).
// Below the grid, the narrower of grid and holder is centred on the other.
function arrange(c, n, m, hd) =
    let (R = ceil(n / c), k = n - (R - 1) * c, gw = c * px - gap, gh = R * py - gap,
         bw = max(gw, h_ext_x))
    !hd ? [gw, gh, 0, 0, 0]
    : m == 0 ? [c * px + h_ext_x, max(gh, h_ext_y), c * px, 0, 0]
    : m == 1 ? [bw, R * py + h_ext_y, (bw - h_ext_x) / 2, R * py, (bw - gw) / 2]
    : k < c ? [max(gw, k * px + h_ext_x), (R - 1) * py + h_ext_y, k * px, (R - 1) * py, 0]
    : undef;
// A plate of w x h fits the bed, and with tower (a multi-colour plate) leaves
// the prime tower's strip free along one edge.
function fits_bed(w, h, tower) =
    tower ? (w <= BED_X - TOWER && h <= BED_Y) || (w <= BED_X && h <= BED_Y - TOWER)
          : w <= BED_X && h <= BED_Y;
function fits(a, tower) = is_list(a) && fits_bed(a[0], a[1], tower);
// Every arrangement of n that fits, as [c, m, W, H, hx, hy, gx].
function options(n, hd, tower) = [for (c = [1 : n], m = hd ? [0 : 2] : [0])
                                  let (a = arrange(c, n, m, hd)) if (fits(a, tower)) concat([c, m], a)];
// The squarest arrangement of n that fits, or undef.
function best(n, hd, tower) =
    let (o = options(n, hd, tower), sc = [for (a = o) max(a[2], a[3])])
    len(o) == 0 ? undef : o[search(min(sc), sc)[0]];
// Most coasters that fit one plate (up to n), and their arrangement.
function layout(n, hd, tower) =
    (!is_undef(best(n, hd, tower)) || n == 1) ? [n, best(n, hd, tower)] : layout(n - 1, hd, tower);

// Which plates are multi-colour, so need the tower: equal colours merge into
// one part and one filament, so it is the distinct colours that count. The
// holder is on plate 1 only.
function count_distinct(v, i = 0, seen = []) =
    i == len(v) ? len(seen)
    : count_distinct(v, i + 1, len([for (s = seen) if (s == v[i]) 1]) > 0 ? seen : concat(seen, [v[i]]));
function multi(colours) = count_distinct([for (c = colours) lower(c)]) > 1;
// The colours coaster(i) draws: with alternate_colors, every other body is
// pattern_color even with no pattern (#1842 review), so it counts whenever a
// second coaster exists. A plate whose coasters are all unswapped may still
// reserve the strip: conservative, never refused.
COASTER_COLOURS = concat([coaster_color],
                         pattern != "none" || (alternate_colors && count > 1) ? [pattern_color] : [],
                         has_border ? [border_color] : [], OVERLAY_ON ? [overlay_color] : []);
TOWER_1 = multi(concat(COASTER_COLOURS, holder ? [holder_color] : []));
TOWER_N = multi(COASTER_COLOURS);

// Plate 1 takes as many coasters as fit beside the holder; the rest go on
// plates of their own, as many to a plate as fit, the last one squarest for
// what is left. ScadBuddy renders each plate with $plate = 1 .. PLATES.
LAYOUT = layout(count, holder, TOWER_1);
N = LAYOUT[0];
REST = count - N;
PER = REST > 0 ? layout(REST, false, TOWER_N)[0] : 1;
PLATES = 1 + ceil(REST / PER);
// First coaster index and coaster count of plate k (1-based).
function plate_first(k) = k == 1 ? 0 : N + (k - 2) * PER;
function plate_n(k) = k == 1 ? N : min(PER, count - plate_first(k));
if (PLATES > 1)
    echo(str("NOTE: ", N, " of ", count, " coasters fit on plate 1",
             TOWER_1 ? " with the prime tower" : "", "; the rest are on plate",
             PLATES == 2 ? " 2" : str("s 2 to ", PLATES)));
echo(plates = PLATES);

// A big coaster and its holder can be too big to sit side by side or one
// above the other even alone (150 mm round with a 20 mm gap: 150 + 20 +
// 156.8 is deeper than the plate, side by side wider). Then the one coaster
// sits above the holder, with the gap cut to fit.
STACKED = holder && is_undef(best(1, true, TOWER_1));
s_gap = min(gap, BED_Y - ext_y - h_ext_y);
// 150 mm + a 3 mm clearance holder leaves 9.2 mm; a wider size or clearance
// range must fail here, not overlap the coaster and the holder.
assert(!STACKED || s_gap >= 0, str("a ", size, " mm coaster and its holder do not fit the plate"));
// Stacked, the plate uses the bed's full depth, so the tower goes beside it.
assert(!STACKED || fits_bed(max(ext_x, h_ext_x), ext_y + s_gap + h_ext_y, TOWER_1),
       str("a ", size, " mm coaster and its holder leave no room for the prime tower"));
if (STACKED && s_gap < gap)
    echo(str("NOTE: gap reduced from ", gap, " to ", s_gap, " mm to fit the coaster and the holder on the plate"));

// BEST is undef when STACKED; every use below sits in the false branch of a
// STACKED ternary, which OpenSCAD evaluates lazily, so undef is never indexed.
BEST = LAYOUT[1];
COLS = STACKED ? 1 : BEST[0];
ROWS = STACKED ? 1 : ceil(N / COLS);         // rows of coasters; the holder is extra
W = STACKED ? max(ext_x, h_ext_x) : BEST[2];
assert(!STACKED || W <= BED_X, str("a ", size, " mm coaster's holder is wider than the plate"));
H = STACKED ? ext_y + s_gap + h_ext_y : BEST[3];
// Coaster j of plate 1, from its centre.
function pos(j) = STACKED ? [0, H / 2 - ext_y / 2]
                : [-W / 2 + BEST[6] + ext_x / 2 + (j % COLS) * px, H / 2 - ext_y / 2 - floor(j / COLS) * py];
h_pos = STACKED ? [0, -H / 2 + h_ext_y / 2]
      : holder ? [-W / 2 + BEST[4] + h_ext_x / 2, H / 2 - BEST[5] - h_ext_y / 2] : [0, 0];
if (holder)
    echo(HOLDER = STACKED ? "stacked" : HOLDER_MODES[BEST[1]]);

// Plates 2 on: coasters only, [columns, rows, width, height] of plate k.
// best() is defined here because PER was chosen under the same TOWER_N, and a
// plate holds at most PER coasters; change one and the other must follow.
function grid(k) = let (b = best(plate_n(k), false, TOWER_N), c = b[0])
                   [c, ceil(plate_n(k) / c), b[2], b[3]];
function grid_pos(k, j) = let (g = grid(k))
    [-g[2] / 2 + ext_x / 2 + (j % g[0]) * px, g[3] / 2 - ext_y / 2 - floor(j / g[0]) * py];
// Drawing every plate ($plate = 0), plates 2 on stand to the right, off the bed.
function plate_shift(k) = $plate == 0 ? [(k - 1) * (BED_X + 2 * gap), 0] : [0, 0];
function on_plate(k) = $plate == 0 || $plate == k;

// Holder: it holds the whole set, 70% of the stack is walled.
stack = count * thickness;
h_height = h_base + max(10, 0.7 * stack);
slot_w = min(0.4 * size, 40);
module holder_part() {
    difference() {
        linear_extrude(h_height) shape_2d(h_in + h_wall);
        translate([0, 0, h_base]) linear_extrude(h_height) shape_2d(h_in);
        // Finger slots front and back, open at the top.
        translate([-slot_w / 2, -h_ext_y, h_base + 3]) cube([slot_w, 2 * h_ext_y, h_height]);
    }
}

// The plate drawn (plate 1 when drawing every plate): [coasters, columns,
// rows, width, height, face down, recess].
SHOWN = max(1, $plate);
echo(COASTERS = SHOWN == 1 ? [N, COLS, ROWS, W, H, face_down, recess_d]
                           : concat([plate_n(SHOWN)], grid(SHOWN), [face_down, recess_d]));

function swapped(i) = alternate_colors && i % 2 == 1;

// Coaster i of the set: the index keeps monogram letters and alternating
// colours running on across the plates.
module coaster(i) {
    color(swapped(i) ? pattern_color : coaster_color) body(i);
    if (pattern != "none")
        color(swapped(i) ? coaster_color : pattern_color) inlay() face_2d() pattern_2d(i);
    if (has_border) color(border_color) inlay() border_2d();
    if (OVERLAY_ON) color(overlay_color) inlay() face_2d() overlay_2d();
}

if (on_plate(1)) {
    for (j = [0 : N - 1]) translate(pos(j)) coaster(j);
    if (holder) color(holder_color) translate(h_pos) holder_part();
}
if (PLATES > 1) for (k = [2 : PLATES]) if (on_plate(k))
    translate(plate_shift(k)) for (j = [0 : plate_n(k) - 1])
        translate(grid_pos(k, j)) coaster(plate_first(k) + j);
